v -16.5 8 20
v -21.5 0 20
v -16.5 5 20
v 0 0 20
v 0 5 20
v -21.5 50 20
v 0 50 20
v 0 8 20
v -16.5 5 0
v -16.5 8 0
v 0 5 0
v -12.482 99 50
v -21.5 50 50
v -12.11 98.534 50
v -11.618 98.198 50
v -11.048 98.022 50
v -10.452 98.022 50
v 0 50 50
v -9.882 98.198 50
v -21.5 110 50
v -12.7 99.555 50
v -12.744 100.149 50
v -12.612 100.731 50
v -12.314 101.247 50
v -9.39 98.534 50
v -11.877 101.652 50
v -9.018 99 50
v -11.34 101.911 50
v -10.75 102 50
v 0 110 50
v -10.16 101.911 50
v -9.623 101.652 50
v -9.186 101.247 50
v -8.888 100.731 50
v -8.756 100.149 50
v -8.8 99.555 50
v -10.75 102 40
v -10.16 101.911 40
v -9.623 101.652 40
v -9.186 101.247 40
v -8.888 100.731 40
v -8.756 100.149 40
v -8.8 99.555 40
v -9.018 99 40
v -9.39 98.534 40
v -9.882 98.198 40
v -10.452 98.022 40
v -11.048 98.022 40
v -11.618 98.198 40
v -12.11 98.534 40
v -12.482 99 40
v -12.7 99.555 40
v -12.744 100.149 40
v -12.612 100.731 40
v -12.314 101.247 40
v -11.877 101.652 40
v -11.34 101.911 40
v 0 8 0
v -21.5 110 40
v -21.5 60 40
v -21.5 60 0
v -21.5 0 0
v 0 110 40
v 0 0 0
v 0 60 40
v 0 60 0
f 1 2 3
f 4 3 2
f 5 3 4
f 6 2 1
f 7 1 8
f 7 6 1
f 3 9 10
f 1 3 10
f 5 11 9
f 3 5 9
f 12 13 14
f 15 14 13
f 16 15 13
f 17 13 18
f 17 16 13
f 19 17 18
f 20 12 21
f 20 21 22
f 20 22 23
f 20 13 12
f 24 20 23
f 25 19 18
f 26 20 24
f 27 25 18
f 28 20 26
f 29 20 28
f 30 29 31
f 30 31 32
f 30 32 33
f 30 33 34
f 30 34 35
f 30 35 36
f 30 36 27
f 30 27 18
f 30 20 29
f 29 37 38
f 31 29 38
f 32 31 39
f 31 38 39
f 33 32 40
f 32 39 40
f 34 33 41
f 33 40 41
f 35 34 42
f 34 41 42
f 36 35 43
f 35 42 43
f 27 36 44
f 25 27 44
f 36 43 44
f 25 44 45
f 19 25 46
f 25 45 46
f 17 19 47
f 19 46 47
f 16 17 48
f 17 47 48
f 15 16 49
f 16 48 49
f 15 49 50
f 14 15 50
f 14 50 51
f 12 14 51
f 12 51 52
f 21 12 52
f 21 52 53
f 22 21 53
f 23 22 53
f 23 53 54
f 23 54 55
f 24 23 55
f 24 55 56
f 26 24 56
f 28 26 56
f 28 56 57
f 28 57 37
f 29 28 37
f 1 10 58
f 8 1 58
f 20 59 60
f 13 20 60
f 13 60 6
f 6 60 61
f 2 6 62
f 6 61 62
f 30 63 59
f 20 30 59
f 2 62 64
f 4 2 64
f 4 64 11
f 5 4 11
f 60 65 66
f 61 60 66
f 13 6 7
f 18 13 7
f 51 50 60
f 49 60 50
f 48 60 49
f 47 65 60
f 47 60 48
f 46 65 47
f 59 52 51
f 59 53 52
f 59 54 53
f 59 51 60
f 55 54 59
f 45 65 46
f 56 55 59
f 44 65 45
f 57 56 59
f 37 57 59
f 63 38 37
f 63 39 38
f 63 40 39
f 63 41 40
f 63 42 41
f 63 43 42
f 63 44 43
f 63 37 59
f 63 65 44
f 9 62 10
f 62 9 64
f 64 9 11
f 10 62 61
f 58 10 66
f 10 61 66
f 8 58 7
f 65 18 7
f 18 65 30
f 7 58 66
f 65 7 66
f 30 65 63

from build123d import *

# Parameters (mm, degrees)
BOSS_EXTRUDE1_DEPTH = 20
SKETCH1_2_W         = 21.5
SKETCH1_2_H         = 60
BOSS_EXTRUDE2_DEPTH = 50
SKETCH3_W           = 40
SKETCH3_H           = 50
CUT_EXTRUDE1_DEPTH  = 50
SKETCH4_R           = 2
CUT_EXTRUDE2_DEPTH  = 50


with BuildPart() as part:
    # Sketch1 → Boss-Extrude1 (new body)
    with BuildSketch(Plane.XY):
        Polygon((0, 8), (0, 50), (0, 110), (-21.5, 110), (-21.5, 50), (-21.5, 0), (0, 0), (0, 5), (-16.5, 5), (-16.5, 8), align=None)
    extrude(amount=BOSS_EXTRUDE1_DEPTH)

    # Sketch1<2> → Boss-Extrude2 (add)
    with BuildSketch(Plane.XY):
        with Locations((-10.75, 80)):
            Rectangle(SKETCH1_2_W, SKETCH1_2_H)
    extrude(amount=BOSS_EXTRUDE2_DEPTH)

    # Sketch3 → Cut-Extrude1 (cut)
    with BuildSketch(Plane(origin=(0, 0, 0), x_dir=(0, 0, -1), z_dir=(1, 0, 0))):
        with Locations((-20, 85)):
            Rectangle(SKETCH3_W, SKETCH3_H)
    extrude(amount=-CUT_EXTRUDE1_DEPTH, mode=Mode.SUBTRACT)

    # Sketch4 → Cut-Extrude2 (cut)
    with BuildSketch(Plane(origin=(0, 0, 40), x_dir=(-1, 0, 0), z_dir=(0, 0, -1))):
        with Locations((10.75, 100)):
            Circle(SKETCH4_R)
    extrude(amount=-CUT_EXTRUDE2_DEPTH, mode=Mode.SUBTRACT)


solid = part.part
